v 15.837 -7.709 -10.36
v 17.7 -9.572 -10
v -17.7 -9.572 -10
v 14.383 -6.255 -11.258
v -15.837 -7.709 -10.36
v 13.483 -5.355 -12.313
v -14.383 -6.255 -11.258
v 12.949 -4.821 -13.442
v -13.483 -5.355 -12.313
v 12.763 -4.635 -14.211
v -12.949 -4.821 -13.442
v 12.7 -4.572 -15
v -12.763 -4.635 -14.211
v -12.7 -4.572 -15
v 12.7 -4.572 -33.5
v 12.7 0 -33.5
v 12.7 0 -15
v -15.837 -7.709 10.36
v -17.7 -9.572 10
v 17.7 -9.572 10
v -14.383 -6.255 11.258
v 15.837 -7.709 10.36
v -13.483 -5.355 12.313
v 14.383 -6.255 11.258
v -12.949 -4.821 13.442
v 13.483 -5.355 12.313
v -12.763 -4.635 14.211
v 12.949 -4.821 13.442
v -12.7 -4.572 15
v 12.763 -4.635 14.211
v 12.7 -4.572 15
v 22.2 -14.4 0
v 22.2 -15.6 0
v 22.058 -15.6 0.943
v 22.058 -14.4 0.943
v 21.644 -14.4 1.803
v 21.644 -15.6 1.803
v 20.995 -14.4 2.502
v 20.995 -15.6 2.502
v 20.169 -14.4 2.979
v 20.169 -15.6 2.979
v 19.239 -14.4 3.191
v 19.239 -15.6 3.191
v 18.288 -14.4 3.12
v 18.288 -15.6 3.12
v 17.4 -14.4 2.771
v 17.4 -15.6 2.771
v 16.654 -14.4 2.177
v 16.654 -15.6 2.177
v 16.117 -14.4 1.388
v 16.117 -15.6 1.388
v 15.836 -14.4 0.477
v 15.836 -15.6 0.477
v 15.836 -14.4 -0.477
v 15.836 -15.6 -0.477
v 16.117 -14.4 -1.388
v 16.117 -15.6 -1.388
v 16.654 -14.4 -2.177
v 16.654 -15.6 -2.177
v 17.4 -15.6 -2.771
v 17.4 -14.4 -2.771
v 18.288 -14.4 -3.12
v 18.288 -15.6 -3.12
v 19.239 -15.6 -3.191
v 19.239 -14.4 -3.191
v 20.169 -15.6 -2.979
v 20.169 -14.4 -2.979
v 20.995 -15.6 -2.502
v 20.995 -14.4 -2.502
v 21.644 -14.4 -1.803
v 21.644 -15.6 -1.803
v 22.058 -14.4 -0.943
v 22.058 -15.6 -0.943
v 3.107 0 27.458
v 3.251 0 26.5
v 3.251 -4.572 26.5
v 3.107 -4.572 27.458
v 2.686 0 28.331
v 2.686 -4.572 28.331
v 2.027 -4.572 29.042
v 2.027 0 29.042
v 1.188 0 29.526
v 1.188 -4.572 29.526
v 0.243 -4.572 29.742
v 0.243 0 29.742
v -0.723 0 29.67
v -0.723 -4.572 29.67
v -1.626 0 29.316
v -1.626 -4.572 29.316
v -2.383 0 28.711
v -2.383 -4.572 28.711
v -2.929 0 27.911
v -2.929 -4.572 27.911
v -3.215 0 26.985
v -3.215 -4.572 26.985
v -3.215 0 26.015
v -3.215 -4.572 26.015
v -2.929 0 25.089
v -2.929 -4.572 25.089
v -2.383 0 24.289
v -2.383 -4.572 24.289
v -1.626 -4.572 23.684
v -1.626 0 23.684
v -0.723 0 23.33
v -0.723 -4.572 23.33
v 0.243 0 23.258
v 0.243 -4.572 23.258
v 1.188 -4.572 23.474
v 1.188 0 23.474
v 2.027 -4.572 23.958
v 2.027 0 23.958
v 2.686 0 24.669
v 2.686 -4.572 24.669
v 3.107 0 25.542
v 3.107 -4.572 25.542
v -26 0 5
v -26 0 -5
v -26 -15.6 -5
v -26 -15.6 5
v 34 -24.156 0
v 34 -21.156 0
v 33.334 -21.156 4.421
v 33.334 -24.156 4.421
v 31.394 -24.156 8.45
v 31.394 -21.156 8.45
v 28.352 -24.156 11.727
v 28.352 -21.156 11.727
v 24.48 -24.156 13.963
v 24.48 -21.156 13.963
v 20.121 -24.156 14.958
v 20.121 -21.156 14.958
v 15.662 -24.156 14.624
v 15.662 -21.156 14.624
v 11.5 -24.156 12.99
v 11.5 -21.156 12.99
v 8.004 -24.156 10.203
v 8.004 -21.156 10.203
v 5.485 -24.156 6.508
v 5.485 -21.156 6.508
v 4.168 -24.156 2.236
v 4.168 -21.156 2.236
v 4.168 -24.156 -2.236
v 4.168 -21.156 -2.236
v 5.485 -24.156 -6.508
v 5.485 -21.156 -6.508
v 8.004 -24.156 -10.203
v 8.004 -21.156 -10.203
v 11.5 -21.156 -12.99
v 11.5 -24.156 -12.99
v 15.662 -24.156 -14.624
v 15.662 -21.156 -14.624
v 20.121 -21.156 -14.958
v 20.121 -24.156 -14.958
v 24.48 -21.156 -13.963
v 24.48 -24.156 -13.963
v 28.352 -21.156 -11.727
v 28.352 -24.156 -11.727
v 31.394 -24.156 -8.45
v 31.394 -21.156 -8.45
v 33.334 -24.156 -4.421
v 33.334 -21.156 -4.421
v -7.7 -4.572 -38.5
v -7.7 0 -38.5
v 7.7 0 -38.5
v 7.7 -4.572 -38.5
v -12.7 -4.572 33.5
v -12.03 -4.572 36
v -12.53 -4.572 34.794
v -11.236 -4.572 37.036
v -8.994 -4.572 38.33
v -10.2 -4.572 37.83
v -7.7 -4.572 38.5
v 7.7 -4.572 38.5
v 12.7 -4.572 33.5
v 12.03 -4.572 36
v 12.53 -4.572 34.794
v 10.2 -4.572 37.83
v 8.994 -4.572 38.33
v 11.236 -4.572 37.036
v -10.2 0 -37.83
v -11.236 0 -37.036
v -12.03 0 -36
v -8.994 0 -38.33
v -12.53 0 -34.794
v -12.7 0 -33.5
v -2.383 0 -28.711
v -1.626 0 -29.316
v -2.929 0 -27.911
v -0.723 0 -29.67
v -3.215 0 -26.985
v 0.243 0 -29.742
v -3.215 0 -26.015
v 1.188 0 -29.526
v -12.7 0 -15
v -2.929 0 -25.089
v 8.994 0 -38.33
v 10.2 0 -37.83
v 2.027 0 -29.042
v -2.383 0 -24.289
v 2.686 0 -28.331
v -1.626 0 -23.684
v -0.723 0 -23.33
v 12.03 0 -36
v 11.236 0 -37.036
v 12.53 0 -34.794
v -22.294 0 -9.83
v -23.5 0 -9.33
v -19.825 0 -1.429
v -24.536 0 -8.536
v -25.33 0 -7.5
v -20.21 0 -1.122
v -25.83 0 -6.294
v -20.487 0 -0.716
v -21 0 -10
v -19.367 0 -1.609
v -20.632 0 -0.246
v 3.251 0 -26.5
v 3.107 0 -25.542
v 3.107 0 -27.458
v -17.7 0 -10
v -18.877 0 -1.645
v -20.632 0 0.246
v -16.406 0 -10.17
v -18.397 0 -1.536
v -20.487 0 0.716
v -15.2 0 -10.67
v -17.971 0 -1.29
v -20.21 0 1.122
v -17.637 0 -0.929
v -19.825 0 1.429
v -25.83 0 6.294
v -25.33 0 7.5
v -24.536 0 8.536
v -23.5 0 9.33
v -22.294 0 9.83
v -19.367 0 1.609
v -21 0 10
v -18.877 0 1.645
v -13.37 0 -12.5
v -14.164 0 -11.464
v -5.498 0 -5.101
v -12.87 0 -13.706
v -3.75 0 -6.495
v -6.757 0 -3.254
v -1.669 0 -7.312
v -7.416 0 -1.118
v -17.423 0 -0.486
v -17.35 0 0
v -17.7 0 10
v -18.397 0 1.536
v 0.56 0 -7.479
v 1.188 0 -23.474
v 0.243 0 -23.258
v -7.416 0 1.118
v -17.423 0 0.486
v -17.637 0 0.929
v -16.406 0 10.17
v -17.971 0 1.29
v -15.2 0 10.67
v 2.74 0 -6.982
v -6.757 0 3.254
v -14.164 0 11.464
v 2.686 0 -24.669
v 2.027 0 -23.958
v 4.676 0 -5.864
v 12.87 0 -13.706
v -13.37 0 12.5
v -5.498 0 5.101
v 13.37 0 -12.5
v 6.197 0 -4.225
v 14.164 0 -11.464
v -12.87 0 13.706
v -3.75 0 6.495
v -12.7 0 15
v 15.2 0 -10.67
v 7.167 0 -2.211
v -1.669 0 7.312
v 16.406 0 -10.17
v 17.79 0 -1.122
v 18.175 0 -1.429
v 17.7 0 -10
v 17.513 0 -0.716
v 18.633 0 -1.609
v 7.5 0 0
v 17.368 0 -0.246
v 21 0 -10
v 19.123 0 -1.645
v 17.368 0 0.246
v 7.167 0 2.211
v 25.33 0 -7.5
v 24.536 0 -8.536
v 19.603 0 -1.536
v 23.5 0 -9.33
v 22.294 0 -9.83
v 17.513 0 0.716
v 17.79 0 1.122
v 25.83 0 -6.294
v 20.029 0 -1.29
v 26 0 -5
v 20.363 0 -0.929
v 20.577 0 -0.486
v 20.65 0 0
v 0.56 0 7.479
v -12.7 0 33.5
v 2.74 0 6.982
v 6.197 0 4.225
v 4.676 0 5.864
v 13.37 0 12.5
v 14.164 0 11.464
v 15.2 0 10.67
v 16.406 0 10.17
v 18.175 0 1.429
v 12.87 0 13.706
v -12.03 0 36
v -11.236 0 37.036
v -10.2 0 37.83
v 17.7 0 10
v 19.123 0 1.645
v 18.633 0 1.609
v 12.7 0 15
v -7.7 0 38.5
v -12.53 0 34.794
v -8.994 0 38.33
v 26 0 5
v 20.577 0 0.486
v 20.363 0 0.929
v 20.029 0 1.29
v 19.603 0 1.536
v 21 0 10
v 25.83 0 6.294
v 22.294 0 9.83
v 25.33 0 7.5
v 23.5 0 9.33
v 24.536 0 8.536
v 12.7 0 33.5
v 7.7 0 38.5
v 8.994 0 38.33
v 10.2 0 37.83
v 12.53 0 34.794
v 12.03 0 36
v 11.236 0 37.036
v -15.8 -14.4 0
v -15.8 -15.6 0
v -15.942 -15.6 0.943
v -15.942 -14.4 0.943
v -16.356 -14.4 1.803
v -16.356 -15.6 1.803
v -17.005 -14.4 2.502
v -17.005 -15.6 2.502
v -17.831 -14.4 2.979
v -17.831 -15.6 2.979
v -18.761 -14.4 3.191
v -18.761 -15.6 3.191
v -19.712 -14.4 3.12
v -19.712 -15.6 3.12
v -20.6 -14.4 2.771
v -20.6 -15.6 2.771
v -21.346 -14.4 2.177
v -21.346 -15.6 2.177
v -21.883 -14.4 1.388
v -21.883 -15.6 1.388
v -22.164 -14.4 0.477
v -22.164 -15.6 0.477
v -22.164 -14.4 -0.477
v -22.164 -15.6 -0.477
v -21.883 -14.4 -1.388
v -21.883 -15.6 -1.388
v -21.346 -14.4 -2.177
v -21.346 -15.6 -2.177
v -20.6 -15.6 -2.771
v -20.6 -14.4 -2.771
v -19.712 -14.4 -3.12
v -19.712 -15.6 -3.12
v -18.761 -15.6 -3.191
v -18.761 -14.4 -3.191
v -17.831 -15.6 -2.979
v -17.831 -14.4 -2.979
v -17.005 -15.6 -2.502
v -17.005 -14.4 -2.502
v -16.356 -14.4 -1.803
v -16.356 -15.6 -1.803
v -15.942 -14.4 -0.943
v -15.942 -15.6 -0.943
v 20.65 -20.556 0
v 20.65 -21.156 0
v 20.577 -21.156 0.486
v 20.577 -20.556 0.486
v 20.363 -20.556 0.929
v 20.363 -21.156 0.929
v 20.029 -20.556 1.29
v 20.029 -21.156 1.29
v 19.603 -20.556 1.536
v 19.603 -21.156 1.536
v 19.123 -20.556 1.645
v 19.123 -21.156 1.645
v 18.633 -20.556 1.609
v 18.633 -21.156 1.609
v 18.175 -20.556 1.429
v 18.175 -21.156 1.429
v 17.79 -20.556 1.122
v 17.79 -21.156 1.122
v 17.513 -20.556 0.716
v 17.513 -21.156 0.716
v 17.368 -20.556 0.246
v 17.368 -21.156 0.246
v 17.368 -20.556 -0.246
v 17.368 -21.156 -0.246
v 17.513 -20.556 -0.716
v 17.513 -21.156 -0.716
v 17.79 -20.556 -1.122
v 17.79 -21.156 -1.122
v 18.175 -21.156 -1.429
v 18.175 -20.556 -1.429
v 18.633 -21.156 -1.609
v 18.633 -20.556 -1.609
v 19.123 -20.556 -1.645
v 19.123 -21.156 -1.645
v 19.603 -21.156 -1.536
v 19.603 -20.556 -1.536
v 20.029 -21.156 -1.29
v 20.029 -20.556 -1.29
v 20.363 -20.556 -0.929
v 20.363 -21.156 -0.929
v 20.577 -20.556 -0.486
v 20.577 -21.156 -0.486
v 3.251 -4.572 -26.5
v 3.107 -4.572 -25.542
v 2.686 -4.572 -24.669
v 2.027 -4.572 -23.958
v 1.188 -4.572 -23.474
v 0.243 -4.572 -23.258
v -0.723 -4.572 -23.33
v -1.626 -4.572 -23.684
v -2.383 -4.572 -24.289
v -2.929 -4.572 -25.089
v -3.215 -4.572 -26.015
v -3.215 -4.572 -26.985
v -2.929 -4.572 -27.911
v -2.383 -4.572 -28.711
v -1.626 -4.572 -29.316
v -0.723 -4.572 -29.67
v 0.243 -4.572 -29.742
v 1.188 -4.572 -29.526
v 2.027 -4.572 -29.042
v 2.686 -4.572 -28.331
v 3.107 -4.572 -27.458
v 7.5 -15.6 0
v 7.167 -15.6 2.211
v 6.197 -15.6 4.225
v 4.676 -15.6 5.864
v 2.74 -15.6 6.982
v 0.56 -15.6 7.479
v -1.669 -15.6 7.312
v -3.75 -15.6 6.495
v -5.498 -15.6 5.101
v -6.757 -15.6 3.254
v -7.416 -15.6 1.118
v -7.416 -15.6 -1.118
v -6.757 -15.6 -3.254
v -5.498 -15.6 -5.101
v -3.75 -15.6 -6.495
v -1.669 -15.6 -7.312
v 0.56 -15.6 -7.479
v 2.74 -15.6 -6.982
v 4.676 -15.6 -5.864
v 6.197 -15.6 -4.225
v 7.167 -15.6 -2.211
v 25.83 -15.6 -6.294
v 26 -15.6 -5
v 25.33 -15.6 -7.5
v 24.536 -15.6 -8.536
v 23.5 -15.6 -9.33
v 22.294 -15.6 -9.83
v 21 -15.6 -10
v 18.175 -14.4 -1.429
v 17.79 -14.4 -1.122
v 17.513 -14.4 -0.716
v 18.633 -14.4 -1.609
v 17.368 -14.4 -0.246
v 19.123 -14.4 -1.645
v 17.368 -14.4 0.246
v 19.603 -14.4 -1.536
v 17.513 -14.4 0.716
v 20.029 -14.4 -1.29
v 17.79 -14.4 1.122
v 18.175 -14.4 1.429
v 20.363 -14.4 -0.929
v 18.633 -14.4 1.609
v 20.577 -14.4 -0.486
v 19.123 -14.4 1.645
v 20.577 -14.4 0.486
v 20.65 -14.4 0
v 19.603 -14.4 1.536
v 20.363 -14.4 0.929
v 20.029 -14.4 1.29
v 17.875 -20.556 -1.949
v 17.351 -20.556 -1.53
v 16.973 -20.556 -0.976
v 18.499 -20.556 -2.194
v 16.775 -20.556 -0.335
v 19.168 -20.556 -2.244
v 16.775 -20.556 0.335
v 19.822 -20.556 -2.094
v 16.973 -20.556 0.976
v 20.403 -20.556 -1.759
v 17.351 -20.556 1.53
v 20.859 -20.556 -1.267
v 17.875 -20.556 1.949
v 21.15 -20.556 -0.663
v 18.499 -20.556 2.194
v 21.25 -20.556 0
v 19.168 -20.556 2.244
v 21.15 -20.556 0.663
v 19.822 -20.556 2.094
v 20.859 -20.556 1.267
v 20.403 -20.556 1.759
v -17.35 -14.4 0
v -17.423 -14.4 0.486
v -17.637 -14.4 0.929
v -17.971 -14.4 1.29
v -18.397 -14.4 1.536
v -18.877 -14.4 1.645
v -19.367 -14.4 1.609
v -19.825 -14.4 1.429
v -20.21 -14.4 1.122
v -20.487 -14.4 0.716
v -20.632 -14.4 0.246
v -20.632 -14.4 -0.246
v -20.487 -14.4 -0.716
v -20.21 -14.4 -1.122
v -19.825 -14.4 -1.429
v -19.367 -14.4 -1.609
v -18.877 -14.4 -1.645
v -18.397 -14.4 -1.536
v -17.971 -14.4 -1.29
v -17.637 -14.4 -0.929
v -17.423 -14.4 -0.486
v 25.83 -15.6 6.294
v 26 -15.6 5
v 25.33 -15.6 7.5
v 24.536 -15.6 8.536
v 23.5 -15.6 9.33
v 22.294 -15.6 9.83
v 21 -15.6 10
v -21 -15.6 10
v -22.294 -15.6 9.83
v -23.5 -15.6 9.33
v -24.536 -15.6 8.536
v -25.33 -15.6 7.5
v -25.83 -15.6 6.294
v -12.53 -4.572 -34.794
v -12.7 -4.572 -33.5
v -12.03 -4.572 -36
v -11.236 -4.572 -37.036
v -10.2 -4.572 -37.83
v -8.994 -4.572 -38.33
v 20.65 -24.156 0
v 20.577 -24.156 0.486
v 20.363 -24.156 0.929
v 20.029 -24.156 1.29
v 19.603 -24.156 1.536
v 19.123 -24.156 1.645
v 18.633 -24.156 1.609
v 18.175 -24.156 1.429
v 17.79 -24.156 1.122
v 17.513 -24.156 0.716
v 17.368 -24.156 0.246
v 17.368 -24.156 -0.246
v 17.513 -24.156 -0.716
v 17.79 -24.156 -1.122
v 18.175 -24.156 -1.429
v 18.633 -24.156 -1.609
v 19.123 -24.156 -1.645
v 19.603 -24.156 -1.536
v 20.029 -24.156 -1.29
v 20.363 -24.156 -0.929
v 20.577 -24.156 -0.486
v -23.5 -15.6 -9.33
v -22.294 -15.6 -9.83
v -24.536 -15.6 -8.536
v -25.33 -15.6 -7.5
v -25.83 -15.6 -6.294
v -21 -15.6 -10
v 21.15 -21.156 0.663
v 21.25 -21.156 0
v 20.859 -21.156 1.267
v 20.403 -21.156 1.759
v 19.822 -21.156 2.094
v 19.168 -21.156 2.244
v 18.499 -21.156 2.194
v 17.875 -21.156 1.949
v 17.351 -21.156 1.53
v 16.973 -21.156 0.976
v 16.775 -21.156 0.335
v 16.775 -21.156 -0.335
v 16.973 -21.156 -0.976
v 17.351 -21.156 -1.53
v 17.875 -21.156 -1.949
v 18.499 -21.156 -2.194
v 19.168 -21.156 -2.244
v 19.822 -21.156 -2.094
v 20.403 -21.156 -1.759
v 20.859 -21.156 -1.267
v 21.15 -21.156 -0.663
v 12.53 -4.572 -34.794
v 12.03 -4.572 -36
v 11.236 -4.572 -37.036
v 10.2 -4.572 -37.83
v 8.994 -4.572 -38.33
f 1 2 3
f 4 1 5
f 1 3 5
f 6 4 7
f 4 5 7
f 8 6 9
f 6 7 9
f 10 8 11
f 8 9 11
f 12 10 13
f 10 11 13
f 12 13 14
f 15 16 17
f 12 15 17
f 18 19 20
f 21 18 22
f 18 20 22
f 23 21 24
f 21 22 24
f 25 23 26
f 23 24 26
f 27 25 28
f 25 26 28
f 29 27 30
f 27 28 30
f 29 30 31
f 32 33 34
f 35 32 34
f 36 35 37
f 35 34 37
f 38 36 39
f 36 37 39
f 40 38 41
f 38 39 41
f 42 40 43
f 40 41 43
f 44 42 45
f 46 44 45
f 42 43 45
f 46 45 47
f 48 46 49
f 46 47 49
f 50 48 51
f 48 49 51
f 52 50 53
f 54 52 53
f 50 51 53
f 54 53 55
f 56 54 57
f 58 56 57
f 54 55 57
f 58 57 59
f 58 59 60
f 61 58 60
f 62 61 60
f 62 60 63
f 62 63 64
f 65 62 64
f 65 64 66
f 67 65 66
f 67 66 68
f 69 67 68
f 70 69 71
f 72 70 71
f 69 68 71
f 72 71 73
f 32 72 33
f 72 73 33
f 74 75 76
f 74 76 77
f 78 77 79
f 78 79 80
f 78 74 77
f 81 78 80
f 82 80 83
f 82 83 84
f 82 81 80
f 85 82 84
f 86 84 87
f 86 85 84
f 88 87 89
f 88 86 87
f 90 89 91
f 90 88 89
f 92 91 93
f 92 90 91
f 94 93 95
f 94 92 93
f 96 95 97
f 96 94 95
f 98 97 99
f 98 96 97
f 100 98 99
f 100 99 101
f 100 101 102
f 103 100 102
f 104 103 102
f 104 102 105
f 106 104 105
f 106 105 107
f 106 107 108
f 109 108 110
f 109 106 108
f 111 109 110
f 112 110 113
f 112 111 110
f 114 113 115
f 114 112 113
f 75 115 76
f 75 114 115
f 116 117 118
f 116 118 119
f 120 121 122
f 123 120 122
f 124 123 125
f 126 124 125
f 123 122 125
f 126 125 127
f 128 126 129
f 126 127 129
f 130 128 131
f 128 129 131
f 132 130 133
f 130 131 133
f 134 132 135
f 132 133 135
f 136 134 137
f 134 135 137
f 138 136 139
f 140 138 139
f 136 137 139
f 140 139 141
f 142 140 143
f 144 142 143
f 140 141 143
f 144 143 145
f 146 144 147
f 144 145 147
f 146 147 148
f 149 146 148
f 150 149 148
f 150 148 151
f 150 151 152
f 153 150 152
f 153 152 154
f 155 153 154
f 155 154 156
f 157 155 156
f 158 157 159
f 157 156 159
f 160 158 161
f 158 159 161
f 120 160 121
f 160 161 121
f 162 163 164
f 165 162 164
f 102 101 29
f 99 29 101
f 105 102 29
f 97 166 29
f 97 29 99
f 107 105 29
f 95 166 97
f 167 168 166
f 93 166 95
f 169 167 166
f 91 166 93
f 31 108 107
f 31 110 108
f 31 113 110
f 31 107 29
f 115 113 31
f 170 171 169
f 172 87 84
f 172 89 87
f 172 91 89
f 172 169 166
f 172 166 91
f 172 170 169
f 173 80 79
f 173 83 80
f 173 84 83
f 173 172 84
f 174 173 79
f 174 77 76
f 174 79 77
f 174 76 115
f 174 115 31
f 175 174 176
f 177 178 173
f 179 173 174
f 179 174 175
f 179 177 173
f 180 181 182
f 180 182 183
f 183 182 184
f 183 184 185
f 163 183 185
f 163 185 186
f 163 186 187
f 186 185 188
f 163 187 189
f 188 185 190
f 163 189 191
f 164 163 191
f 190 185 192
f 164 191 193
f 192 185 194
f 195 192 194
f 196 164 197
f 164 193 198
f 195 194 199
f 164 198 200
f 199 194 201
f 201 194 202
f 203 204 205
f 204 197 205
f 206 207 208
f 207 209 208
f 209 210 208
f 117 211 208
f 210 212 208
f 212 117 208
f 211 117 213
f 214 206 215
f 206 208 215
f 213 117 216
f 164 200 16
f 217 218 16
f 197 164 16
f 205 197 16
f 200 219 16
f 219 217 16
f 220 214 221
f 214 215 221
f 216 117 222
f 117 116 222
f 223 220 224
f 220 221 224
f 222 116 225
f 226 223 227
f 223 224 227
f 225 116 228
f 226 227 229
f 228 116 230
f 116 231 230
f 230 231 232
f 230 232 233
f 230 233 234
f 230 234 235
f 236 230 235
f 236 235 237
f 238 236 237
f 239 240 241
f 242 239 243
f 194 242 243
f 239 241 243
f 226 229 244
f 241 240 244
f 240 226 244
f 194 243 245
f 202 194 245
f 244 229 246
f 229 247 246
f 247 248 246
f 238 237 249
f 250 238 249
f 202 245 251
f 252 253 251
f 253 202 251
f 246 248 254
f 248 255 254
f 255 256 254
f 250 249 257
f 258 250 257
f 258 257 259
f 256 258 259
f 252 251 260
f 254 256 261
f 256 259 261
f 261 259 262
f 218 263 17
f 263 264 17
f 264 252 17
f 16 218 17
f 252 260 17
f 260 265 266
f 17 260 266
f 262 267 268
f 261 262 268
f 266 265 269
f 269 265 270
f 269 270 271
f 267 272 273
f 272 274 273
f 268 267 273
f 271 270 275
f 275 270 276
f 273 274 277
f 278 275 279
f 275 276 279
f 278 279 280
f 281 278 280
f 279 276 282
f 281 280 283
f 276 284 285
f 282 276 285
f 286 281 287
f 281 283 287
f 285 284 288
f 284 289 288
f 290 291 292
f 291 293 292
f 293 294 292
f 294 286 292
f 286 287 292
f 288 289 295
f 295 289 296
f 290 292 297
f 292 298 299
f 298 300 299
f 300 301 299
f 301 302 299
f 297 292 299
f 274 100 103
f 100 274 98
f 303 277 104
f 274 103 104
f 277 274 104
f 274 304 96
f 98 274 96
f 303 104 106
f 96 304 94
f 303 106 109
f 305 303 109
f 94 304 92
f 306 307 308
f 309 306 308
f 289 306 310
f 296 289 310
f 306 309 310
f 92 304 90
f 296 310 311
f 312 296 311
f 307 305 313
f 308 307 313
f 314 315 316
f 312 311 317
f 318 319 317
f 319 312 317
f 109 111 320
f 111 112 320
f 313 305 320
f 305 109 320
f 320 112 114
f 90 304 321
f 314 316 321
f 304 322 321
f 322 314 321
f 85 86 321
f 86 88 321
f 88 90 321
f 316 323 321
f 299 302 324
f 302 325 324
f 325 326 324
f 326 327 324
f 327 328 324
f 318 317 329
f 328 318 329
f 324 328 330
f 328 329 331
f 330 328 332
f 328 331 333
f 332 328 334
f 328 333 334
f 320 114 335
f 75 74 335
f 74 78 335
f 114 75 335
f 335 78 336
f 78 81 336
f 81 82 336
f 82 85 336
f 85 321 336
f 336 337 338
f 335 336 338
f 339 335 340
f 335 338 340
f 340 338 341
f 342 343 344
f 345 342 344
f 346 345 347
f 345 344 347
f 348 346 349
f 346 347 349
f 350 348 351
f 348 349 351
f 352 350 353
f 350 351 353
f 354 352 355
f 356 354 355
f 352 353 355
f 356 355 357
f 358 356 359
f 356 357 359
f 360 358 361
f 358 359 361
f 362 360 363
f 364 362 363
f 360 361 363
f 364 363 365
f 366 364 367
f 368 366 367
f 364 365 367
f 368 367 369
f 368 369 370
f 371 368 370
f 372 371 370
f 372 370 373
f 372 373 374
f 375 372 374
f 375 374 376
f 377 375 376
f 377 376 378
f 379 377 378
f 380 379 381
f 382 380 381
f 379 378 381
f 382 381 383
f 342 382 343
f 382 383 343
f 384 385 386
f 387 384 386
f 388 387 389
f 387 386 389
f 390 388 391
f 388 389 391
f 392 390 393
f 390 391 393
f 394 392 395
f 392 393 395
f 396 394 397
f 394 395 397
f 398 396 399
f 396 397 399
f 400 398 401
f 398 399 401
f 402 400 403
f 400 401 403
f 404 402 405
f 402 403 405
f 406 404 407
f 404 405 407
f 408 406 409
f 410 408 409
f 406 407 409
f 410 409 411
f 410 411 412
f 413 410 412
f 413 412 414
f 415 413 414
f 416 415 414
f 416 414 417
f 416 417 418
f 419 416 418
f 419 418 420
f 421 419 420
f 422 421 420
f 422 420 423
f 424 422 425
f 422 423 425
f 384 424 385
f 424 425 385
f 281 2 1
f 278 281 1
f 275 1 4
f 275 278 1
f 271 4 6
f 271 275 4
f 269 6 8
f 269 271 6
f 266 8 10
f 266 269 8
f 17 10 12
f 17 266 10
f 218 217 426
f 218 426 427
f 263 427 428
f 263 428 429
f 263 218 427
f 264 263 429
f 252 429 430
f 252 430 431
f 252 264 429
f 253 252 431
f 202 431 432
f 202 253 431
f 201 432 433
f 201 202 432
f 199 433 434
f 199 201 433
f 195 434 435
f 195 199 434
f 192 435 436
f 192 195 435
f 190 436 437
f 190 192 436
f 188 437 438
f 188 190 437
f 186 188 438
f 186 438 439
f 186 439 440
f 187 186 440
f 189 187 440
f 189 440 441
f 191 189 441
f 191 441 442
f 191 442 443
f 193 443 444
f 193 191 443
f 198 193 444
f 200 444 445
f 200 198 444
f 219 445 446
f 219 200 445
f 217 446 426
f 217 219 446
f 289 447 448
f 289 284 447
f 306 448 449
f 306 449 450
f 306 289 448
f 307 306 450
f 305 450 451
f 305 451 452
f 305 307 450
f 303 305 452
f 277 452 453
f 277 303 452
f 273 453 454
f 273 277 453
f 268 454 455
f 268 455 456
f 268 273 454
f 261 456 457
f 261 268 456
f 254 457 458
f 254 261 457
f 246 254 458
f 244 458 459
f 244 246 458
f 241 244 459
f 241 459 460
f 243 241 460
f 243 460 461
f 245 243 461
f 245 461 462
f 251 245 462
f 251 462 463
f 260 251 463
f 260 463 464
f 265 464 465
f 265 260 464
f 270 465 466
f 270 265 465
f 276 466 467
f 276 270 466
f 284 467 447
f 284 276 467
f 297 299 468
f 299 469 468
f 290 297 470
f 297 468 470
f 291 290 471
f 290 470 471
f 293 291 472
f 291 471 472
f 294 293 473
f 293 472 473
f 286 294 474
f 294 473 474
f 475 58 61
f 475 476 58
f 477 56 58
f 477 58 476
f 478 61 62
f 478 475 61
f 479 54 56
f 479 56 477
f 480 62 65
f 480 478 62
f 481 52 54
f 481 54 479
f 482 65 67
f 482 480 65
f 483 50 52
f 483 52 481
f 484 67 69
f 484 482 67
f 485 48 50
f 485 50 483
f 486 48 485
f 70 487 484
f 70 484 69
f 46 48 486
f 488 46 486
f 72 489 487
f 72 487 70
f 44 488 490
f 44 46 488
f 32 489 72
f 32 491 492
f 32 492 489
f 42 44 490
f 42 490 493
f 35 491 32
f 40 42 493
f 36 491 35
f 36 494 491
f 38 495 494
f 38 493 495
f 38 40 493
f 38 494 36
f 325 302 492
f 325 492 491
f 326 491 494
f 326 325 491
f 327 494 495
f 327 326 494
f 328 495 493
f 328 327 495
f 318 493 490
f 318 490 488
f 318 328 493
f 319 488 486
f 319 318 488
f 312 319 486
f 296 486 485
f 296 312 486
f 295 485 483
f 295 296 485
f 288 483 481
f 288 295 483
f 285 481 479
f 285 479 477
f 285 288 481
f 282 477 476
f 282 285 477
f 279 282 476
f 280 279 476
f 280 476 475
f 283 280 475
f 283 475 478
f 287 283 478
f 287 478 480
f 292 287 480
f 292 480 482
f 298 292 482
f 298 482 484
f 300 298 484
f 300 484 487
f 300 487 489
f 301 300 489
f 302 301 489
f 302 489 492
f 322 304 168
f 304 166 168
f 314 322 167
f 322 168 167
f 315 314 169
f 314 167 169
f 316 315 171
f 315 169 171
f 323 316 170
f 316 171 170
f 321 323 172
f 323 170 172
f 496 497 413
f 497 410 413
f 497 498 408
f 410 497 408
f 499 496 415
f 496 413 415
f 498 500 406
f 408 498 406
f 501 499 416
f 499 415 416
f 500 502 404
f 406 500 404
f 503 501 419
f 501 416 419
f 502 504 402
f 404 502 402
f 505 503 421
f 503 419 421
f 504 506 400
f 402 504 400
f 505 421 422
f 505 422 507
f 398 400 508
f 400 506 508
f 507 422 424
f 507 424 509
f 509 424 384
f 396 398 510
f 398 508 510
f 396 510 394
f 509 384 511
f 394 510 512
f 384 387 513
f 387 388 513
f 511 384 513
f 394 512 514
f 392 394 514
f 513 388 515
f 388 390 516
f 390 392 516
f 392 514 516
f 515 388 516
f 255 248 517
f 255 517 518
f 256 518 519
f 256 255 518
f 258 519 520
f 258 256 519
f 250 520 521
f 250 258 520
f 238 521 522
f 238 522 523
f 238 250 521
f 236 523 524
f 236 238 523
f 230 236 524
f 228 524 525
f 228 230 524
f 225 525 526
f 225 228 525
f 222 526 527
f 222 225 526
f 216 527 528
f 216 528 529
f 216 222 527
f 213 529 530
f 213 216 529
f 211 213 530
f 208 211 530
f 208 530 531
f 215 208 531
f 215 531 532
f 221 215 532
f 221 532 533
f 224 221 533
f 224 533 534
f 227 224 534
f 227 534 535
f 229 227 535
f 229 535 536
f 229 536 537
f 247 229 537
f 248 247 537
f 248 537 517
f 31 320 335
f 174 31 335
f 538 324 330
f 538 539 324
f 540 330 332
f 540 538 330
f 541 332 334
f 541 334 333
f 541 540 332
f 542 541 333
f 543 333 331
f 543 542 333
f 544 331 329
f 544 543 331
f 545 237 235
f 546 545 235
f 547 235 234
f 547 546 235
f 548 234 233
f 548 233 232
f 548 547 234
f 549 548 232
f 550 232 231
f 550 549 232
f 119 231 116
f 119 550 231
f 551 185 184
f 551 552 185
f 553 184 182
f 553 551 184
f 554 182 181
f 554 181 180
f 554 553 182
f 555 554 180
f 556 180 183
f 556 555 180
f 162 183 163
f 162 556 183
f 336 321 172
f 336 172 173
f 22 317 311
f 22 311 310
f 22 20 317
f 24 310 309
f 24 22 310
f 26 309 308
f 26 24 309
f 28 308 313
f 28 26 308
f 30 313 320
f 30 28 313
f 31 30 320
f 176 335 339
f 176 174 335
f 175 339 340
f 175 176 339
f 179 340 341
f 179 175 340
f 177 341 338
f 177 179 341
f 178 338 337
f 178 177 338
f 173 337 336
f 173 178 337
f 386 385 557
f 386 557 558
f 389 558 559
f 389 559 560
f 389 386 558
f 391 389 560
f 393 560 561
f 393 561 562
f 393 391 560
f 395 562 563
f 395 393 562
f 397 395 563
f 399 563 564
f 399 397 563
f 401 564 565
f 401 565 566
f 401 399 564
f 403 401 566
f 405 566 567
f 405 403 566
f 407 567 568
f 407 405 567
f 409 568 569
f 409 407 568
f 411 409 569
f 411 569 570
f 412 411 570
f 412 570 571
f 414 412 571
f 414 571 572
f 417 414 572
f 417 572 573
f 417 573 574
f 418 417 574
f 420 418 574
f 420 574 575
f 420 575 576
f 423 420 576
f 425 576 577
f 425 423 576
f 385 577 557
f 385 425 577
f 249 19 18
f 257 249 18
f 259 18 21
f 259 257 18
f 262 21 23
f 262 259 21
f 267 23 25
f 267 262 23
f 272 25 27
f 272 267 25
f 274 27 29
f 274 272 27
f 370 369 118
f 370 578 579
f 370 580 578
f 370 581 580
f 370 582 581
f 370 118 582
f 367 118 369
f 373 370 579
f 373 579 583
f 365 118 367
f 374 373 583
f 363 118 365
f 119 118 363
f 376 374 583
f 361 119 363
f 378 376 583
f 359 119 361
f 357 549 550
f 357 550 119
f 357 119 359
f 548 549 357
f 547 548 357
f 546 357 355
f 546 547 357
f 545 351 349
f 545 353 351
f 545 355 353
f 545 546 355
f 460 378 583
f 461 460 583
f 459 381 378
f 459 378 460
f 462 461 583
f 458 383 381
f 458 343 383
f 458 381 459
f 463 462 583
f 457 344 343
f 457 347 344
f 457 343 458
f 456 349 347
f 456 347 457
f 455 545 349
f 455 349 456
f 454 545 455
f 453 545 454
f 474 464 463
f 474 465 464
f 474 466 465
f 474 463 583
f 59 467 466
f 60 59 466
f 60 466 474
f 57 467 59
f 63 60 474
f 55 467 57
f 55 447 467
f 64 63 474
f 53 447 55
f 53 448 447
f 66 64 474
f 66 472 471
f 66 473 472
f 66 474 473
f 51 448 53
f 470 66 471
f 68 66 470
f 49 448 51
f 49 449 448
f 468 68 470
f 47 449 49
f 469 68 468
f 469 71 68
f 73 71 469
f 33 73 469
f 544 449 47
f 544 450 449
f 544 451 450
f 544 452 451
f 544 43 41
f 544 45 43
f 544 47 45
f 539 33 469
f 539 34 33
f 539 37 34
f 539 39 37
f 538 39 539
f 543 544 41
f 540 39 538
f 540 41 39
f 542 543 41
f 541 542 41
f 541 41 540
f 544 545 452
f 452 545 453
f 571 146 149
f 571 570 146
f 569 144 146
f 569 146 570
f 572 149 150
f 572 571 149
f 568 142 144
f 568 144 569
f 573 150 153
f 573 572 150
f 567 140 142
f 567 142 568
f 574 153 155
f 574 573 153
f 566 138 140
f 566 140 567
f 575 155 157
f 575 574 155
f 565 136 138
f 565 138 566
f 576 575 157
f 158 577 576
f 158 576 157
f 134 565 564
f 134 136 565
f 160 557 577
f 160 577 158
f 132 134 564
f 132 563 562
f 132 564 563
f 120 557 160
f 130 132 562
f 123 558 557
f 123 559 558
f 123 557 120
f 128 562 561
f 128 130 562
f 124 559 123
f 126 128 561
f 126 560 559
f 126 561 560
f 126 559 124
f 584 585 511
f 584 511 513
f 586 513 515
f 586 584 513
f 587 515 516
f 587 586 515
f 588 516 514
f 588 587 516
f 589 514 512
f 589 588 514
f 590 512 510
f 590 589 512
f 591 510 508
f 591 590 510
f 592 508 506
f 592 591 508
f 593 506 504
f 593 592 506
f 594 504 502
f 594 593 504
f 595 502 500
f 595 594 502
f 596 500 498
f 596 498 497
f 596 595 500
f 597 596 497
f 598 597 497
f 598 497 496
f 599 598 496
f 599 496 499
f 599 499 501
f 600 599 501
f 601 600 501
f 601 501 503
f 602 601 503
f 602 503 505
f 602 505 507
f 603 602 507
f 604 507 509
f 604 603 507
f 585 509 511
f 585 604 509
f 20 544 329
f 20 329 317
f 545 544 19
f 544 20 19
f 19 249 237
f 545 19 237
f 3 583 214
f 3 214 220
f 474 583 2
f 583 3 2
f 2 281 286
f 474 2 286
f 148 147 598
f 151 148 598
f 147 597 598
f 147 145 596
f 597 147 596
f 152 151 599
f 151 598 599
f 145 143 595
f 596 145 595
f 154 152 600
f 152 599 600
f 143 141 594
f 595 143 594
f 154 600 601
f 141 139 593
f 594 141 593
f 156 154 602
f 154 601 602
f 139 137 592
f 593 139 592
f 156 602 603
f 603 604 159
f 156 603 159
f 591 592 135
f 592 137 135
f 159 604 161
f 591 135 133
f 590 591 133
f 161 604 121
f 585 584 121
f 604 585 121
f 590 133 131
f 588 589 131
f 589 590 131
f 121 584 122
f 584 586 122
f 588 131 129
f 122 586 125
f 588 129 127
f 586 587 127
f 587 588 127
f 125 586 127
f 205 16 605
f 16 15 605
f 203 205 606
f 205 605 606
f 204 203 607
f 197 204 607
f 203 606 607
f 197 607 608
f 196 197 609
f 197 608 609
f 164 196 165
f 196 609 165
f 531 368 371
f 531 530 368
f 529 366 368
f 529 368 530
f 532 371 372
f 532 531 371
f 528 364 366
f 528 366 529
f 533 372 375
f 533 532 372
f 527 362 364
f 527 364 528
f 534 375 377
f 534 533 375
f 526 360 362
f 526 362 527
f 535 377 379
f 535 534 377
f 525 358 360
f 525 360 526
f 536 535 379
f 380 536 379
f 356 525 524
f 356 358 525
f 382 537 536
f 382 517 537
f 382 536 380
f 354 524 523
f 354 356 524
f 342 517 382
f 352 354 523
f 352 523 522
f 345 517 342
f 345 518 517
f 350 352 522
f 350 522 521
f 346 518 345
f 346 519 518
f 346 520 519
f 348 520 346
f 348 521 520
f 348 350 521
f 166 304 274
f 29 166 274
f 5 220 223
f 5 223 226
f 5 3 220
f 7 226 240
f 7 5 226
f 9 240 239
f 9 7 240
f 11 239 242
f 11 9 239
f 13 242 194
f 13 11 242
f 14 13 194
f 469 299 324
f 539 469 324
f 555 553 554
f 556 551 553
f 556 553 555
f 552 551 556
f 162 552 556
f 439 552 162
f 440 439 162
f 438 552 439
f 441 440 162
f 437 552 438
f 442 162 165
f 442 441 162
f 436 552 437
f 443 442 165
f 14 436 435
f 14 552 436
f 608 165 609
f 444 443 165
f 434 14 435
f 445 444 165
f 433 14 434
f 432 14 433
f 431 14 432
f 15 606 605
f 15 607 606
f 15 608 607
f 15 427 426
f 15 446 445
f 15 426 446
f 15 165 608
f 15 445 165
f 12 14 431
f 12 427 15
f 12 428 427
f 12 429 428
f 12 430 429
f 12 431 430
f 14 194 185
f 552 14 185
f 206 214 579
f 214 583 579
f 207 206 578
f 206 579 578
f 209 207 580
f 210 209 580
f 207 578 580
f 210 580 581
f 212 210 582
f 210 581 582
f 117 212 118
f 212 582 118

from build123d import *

# Parameters (mm, degrees)
F0_W     = 25.4
F0_H     = 28.5
F0_R     = 3.2512
F0_H_2   = 20
F0_R_2   = 7.5
F1_DEPTH = 4.572
F0_W_2   = 13.3
F0_R_3   = 1.65
F2_DEPTH = 15.6
F3_R     = 3.2
F3_R_2   = 1.65
F4_DEPTH = 1.2
F5_R     = 5
F7_R     = 15
F7_R_2   = 2.25
F7_R_3   = 1.65
F8_DEPTH = 3
F9_DEPTH = 0.6


# Not quite as in the source:
# - a length typed as a fraction of an inch, garbled in the dataset ("3 / 203.2 mm" for 3/8 in), is restored


with BuildPart() as f1:
    # F0 (on Front) → F1 (new body)
    with BuildSketch(Plane.XZ):
        with Locations((0, 24.25)):
            Rectangle(F0_W, F0_H)
        with Locations((0, 26.5)):
            Circle(F0_R, mode=Mode.SUBTRACT)
        with Locations((0, -24.25)):
            Rectangle(F0_W, F0_H)
        with Locations((0, -26.5)):
            Circle(F0_R, mode=Mode.SUBTRACT)
        Rectangle(F0_W, F0_H_2)
        Circle(F0_R_2, mode=Mode.SUBTRACT)
    extrude(amount=F1_DEPTH)

    # F0 (on Front) → F2 (join)
    with BuildSketch(Plane.XZ):
        with Locations((19.35, 0)):
            Rectangle(F0_W_2, F0_H_2)
        with Locations((19, 0)):
            Circle(F0_R_3, mode=Mode.SUBTRACT)
        with Locations((-19.35, 0)):
            Rectangle(F0_W_2, F0_H_2)
        with Locations((-19, 0)):
            Circle(F0_R_3, mode=Mode.SUBTRACT)
        Rectangle(F0_W, F0_H_2)
        Circle(F0_R_2, mode=Mode.SUBTRACT)
    extrude(amount=F2_DEPTH)

    # F3 (on face) → F4 (cut)
    with BuildSketch(Plane.XZ.offset(15.6)):
        with Locations((-19, 0)):
            Circle(F3_R)
        with Locations((-19, 0)):
            Circle(F3_R_2, mode=Mode.SUBTRACT)
        with Locations((19, 0)):
            Circle(F3_R)
        with Locations((19, 0)):
            Circle(F3_R_2, mode=Mode.SUBTRACT)
    extrude(amount=-F4_DEPTH, mode=Mode.SUBTRACT)

    # F5
    f5_edges = [f1.edges().sort_by_distance(p)[0] for p in [
        (0, -4.572, 10),
        (0, -4.572, -10),
        (26, -7.8, -10),
        (-26, -7.8, -10),
        (-26, -7.8, 10),
        (26, -7.8, 10),
        (-12.7, -2.286, 10),
        (12.7, -2.286, 10),
        (12.7, -2.286, -10),
        (-12.7, -2.286, -10),
        (12.7, -2.286, 38.5),
        (-12.7, -2.286, 38.5),
        (12.7, -2.286, -38.5),
        (-12.7, -2.286, -38.5),
    ]]
    fillet(f5_edges, radius=F5_R)


with BuildPart() as f8:
    # F7 (on offset) → F8 (new body)
    with BuildSketch(Plane.XZ.offset(21.15625)):
        with Locations((19, 0)):
            Circle(F7_R)
        with Locations((19, 0)):
            Circle(F7_R_2, mode=Mode.SUBTRACT)
        with Locations((19, 0)):
            Circle(F7_R_2)
        with Locations((19, 0)):
            Circle(F7_R_3, mode=Mode.SUBTRACT)
    extrude(amount=F8_DEPTH)

    # F7 (on offset) → F9 (join)
    with BuildSketch(Plane.XZ.offset(21.15625)):
        with Locations((19, 0)):
            Circle(F7_R_2)
        with Locations((19, 0)):
            Circle(F7_R_3, mode=Mode.SUBTRACT)
    extrude(amount=-F9_DEPTH)


solid = Compound([f1.part, f8.part])
